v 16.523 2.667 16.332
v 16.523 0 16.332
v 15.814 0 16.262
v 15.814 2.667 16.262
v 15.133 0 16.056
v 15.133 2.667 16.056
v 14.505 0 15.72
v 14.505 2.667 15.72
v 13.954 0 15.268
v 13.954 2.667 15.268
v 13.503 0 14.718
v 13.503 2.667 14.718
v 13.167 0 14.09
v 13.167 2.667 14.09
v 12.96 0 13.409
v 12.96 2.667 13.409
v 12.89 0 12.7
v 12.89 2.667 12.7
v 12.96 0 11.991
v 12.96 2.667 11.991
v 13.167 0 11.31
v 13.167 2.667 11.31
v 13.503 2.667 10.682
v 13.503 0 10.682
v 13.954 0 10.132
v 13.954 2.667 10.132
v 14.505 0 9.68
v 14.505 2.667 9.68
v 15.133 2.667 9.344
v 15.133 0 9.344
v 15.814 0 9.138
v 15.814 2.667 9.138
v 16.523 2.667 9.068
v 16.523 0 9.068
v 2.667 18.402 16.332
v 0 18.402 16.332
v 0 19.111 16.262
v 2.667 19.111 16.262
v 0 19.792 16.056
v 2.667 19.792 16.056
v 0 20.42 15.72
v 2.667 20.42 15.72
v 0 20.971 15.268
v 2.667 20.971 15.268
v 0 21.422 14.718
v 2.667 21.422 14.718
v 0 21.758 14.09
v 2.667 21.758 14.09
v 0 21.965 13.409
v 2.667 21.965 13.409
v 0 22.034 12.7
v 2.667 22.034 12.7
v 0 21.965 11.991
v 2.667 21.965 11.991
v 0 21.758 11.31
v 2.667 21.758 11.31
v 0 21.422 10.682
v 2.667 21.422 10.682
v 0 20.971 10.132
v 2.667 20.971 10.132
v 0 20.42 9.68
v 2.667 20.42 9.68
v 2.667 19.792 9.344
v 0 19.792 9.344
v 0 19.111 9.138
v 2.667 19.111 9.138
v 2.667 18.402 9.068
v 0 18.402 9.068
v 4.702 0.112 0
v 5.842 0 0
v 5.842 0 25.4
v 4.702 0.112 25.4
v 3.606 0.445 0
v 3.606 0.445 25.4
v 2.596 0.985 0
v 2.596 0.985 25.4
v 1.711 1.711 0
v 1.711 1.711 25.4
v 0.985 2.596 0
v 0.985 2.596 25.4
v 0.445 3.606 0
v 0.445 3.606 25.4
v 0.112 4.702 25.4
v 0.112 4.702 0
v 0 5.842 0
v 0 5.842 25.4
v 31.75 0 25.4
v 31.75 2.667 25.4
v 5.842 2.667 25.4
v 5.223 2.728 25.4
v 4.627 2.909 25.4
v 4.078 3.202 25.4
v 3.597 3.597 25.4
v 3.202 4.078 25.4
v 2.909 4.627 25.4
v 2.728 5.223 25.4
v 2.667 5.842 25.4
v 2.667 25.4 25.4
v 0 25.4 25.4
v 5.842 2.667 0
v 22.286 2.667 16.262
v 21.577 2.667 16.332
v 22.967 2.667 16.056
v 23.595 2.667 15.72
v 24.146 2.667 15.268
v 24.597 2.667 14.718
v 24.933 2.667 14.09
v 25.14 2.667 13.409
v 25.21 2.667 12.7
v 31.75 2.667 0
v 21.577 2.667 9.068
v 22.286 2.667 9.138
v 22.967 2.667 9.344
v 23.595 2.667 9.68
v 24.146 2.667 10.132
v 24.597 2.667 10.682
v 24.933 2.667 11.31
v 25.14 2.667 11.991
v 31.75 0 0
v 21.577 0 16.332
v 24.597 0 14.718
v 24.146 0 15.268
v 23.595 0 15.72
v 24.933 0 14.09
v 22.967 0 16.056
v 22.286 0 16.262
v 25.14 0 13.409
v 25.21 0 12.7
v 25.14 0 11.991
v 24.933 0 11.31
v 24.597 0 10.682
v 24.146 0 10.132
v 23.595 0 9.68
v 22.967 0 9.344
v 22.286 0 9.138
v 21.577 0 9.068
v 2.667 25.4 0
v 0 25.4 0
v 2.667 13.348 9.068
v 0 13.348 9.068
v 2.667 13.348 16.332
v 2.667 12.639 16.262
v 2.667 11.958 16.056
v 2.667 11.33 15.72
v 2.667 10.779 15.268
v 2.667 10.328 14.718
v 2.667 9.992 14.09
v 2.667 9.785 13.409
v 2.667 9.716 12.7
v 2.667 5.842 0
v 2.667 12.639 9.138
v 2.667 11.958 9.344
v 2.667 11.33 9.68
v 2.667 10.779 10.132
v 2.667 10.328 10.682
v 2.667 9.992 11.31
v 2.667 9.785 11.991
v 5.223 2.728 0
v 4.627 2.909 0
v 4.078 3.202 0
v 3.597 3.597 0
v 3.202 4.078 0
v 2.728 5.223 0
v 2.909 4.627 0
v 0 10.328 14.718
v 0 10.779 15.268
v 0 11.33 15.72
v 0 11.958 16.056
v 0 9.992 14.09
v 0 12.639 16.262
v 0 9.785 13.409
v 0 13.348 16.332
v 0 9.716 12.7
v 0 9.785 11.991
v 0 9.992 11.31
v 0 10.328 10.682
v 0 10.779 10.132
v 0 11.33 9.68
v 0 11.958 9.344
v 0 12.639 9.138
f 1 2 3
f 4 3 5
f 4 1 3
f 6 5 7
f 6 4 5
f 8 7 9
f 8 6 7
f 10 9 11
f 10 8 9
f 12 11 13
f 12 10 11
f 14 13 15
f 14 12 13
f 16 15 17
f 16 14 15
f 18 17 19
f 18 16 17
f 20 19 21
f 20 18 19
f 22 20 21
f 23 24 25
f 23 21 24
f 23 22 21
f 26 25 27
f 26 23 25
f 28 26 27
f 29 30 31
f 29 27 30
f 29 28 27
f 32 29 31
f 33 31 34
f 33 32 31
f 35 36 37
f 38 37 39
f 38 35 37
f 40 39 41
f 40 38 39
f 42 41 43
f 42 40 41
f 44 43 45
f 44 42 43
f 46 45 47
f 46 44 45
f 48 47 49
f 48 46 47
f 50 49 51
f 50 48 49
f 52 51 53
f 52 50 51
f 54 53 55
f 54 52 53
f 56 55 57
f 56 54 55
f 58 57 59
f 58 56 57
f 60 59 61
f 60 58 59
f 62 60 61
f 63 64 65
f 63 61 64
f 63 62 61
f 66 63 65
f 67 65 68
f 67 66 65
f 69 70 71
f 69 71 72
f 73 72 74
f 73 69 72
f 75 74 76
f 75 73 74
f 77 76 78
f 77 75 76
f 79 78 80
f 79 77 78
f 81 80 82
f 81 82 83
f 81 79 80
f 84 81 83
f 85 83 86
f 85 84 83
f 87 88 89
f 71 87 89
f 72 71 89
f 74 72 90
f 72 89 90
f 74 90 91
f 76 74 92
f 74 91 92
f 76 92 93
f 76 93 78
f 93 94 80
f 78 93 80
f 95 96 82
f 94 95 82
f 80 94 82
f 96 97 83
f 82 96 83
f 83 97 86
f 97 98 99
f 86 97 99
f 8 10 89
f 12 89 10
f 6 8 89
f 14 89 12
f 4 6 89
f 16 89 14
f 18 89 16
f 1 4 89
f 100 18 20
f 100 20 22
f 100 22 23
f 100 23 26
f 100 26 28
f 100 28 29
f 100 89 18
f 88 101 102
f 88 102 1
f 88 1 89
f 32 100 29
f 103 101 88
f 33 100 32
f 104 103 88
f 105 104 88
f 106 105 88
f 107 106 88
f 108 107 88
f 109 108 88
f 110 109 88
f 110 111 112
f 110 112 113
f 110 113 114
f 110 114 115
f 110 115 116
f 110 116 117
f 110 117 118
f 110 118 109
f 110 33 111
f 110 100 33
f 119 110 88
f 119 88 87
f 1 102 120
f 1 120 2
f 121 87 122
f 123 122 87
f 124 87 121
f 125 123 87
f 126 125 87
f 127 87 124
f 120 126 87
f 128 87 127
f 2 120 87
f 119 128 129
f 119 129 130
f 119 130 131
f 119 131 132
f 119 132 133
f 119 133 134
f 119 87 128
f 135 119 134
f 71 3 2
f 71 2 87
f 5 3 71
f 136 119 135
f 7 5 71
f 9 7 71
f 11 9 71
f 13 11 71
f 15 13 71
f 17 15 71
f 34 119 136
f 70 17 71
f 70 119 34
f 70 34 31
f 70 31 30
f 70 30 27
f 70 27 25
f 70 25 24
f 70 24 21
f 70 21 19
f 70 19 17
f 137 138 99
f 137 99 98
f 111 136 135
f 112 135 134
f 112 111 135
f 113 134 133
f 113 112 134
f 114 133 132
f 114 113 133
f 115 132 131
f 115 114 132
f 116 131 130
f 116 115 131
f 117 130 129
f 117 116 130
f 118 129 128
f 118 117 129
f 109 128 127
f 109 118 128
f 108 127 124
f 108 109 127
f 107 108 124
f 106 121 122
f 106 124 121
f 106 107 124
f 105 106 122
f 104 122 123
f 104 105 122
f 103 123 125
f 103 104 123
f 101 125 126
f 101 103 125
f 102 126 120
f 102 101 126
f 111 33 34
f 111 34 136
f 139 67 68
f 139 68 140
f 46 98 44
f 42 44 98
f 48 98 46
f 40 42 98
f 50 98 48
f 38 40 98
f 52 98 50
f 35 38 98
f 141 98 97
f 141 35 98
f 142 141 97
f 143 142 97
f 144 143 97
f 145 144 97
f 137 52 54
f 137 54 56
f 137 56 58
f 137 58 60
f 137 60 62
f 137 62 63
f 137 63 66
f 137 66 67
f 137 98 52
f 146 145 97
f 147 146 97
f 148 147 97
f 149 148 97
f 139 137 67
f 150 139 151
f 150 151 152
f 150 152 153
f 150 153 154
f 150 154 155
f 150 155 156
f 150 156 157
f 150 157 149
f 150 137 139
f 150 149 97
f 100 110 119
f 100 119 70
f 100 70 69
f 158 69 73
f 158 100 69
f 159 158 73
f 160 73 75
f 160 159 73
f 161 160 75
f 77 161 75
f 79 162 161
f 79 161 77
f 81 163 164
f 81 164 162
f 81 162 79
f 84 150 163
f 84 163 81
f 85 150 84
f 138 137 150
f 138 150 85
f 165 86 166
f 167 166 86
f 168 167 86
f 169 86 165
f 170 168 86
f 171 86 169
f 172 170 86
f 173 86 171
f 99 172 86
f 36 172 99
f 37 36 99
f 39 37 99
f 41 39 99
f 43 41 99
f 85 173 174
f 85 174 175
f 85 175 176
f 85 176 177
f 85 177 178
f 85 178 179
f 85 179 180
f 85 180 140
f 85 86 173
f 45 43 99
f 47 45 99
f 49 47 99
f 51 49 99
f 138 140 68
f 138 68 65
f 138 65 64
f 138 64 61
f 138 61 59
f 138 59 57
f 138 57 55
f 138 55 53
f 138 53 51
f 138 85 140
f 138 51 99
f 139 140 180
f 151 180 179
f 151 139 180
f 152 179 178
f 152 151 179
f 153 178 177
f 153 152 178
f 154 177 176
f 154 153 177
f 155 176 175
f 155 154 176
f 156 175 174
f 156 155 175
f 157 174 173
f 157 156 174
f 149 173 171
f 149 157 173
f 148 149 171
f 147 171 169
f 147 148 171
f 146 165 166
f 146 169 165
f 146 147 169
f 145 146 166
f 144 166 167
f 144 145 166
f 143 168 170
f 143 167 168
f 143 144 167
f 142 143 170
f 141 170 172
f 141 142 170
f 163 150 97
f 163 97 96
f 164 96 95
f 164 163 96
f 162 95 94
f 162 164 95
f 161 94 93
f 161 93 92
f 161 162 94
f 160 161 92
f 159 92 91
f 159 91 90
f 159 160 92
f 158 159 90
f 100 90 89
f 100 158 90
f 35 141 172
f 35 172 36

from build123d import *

# Parameters (mm, degrees)
BOSS_EXTRUDE1_DEPTH = 25.4
CUT_EXTRUDE1_DEPTH  = 47.218404224
CUT_EXTRUDE2_DEPTH  = 47.583385332


with BuildPart() as part:
    # Sketch2 → Boss-Extrude1 (new body)
    with BuildSketch(Plane.XY):
        with BuildLine():
            Line((0, 5.842), (0, 25.4))
            Line((0, 25.4), (2.667, 25.4))
            Line((2.667, 25.4), (2.667, 5.842))
            ThreePointArc((2.667, 5.842), (3.59693597, 3.59693597), (5.842, 2.667))
            Line((5.842, 2.667), (31.75, 2.667))
            Line((31.75, 2.667), (31.75, 0))
            Line((31.75, 0), (5.842, 0))
            ThreePointArc((5.842, 0), (1.711082184, 1.711082184), (0, 5.842))
        make_face()
    extrude(amount=BOSS_EXTRUDE1_DEPTH)

    # Sketch3 → Cut-Extrude1 (cut, through all)
    with BuildSketch(Plane(origin=(2.667, 0, 0), x_dir=(0, 0, -1), z_dir=(1, 0, 0))):
        with BuildLine():
            Line((-9.0678, 18.4023), (-9.0678, 13.3477))
            ThreePointArc((-9.0678, 13.3477), (-12.7, 9.7155), (-16.3322, 13.3477))
            Line((-16.3322, 13.3477), (-16.3322, 18.4023))
            ThreePointArc((-16.3322, 18.4023), (-12.7, 22.0345), (-9.0678, 18.4023))
        make_face()
    extrude(amount=-CUT_EXTRUDE1_DEPTH, mode=Mode.SUBTRACT)

    # Sketch4 → Cut-Extrude2 (cut, through all)
    with BuildSketch(Plane(origin=(0, 2.667, 0), x_dir=(1, 0, 0), z_dir=(0, 1, 0))):
        with BuildLine():
            Line((21.5773, -16.3322), (16.5227, -16.3322))
            ThreePointArc((16.5227, -16.3322), (12.8905, -12.7), (16.5227, -9.0678))
            Line((16.5227, -9.0678), (21.5773, -9.0678))
            ThreePointArc((21.5773, -9.0678), (25.2095, -12.7), (21.5773, -16.3322))
        make_face()
    extrude(amount=-CUT_EXTRUDE2_DEPTH, mode=Mode.SUBTRACT)


solid = part.part
